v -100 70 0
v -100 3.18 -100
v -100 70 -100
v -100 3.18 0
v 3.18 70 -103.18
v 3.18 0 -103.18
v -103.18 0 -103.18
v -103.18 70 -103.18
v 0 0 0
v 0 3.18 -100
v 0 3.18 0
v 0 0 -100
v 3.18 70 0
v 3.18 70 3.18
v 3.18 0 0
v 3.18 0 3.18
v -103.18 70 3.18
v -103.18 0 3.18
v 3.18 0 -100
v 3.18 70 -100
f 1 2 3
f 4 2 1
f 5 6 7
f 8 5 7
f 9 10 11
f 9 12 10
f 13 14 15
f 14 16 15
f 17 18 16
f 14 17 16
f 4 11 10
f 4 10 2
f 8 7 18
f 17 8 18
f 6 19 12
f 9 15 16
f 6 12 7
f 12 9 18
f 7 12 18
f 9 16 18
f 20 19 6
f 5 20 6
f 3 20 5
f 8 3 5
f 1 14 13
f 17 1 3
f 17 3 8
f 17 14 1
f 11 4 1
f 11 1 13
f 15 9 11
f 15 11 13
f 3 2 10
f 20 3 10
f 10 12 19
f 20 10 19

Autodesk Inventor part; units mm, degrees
ref_plane "YZ Plane" through (0, 0, 0) normal (1, 0, 0) x (0, 1, 0)
ref_plane "XZ Plane" through (0, 0, 0) normal (0, 1, 0) x (-1, 0, 0)
ref_plane "XY Plane" through (0, 0, 0) normal (0, 0, 1) x (1, 0, 0)
sketch "Sketch1" plane through (0, 0, 0) normal (0, 1, 0) x (-1, 0, 0)
  line L0 (0, 0) -> (100, 0)
  line L1 (100, 0) -> (100, -100)
  line L2 (100, -100) -> (0, -100)
  line L3 (0, -100) -> (0, 0)
  dimension "d0" = 100
  dimension "d1" = 100
extrude "Extrusion1" add sketch "Sketch1" along normal blind 3.18
sketch "Sketch2" plane through (0, 0, 0) normal (0, 1, 0) x (-1, 0, 0)
  line L0 (100, 0) -> (0, 0) projected
  line L1 (0, 0) -> (0, -100) projected
  line L2 (0, -100) -> (100, -100) projected
  line L3 (100, -100) -> (100, 0) projected
  line L4 (-3.18, 0) -> (103.18, 0)
  line L5 (103.18, 0) -> (103.18, 3.18)
  line L6 (103.18, 3.18) -> (-3.18, 3.18)
  line L7 (-3.18, 3.18) -> (-3.18, 0)
  line L8 (103.18, -100) -> (-3.18, -100)
  line L9 (-3.18, -100) -> (-3.18, -103.18)
  line L10 (-3.18, -103.18) -> (103.18, -103.18)
  line L11 (103.18, -103.18) -> (103.18, -100)
  line L12 (103.18, 0) -> (100, 0)
  line L13 (100, 0) -> (100, -100)
  line L14 (100, -100) -> (103.18, -100)
  line L15 (103.18, -100) -> (103.18, 0)
  dimension "d4" = 3.18
  dimension "d5" = 3.18
  dimension "d6" = 3.18
  dimension "d7" = 3.18
extrude "Extrusion2" add sketch "Sketch2" along normal blind 70 contours L4 L15 L8 L3 | L0 L4 L7 L6 L5 | L8 L11 L10 L9 L2
properties part number "Base_caja"
